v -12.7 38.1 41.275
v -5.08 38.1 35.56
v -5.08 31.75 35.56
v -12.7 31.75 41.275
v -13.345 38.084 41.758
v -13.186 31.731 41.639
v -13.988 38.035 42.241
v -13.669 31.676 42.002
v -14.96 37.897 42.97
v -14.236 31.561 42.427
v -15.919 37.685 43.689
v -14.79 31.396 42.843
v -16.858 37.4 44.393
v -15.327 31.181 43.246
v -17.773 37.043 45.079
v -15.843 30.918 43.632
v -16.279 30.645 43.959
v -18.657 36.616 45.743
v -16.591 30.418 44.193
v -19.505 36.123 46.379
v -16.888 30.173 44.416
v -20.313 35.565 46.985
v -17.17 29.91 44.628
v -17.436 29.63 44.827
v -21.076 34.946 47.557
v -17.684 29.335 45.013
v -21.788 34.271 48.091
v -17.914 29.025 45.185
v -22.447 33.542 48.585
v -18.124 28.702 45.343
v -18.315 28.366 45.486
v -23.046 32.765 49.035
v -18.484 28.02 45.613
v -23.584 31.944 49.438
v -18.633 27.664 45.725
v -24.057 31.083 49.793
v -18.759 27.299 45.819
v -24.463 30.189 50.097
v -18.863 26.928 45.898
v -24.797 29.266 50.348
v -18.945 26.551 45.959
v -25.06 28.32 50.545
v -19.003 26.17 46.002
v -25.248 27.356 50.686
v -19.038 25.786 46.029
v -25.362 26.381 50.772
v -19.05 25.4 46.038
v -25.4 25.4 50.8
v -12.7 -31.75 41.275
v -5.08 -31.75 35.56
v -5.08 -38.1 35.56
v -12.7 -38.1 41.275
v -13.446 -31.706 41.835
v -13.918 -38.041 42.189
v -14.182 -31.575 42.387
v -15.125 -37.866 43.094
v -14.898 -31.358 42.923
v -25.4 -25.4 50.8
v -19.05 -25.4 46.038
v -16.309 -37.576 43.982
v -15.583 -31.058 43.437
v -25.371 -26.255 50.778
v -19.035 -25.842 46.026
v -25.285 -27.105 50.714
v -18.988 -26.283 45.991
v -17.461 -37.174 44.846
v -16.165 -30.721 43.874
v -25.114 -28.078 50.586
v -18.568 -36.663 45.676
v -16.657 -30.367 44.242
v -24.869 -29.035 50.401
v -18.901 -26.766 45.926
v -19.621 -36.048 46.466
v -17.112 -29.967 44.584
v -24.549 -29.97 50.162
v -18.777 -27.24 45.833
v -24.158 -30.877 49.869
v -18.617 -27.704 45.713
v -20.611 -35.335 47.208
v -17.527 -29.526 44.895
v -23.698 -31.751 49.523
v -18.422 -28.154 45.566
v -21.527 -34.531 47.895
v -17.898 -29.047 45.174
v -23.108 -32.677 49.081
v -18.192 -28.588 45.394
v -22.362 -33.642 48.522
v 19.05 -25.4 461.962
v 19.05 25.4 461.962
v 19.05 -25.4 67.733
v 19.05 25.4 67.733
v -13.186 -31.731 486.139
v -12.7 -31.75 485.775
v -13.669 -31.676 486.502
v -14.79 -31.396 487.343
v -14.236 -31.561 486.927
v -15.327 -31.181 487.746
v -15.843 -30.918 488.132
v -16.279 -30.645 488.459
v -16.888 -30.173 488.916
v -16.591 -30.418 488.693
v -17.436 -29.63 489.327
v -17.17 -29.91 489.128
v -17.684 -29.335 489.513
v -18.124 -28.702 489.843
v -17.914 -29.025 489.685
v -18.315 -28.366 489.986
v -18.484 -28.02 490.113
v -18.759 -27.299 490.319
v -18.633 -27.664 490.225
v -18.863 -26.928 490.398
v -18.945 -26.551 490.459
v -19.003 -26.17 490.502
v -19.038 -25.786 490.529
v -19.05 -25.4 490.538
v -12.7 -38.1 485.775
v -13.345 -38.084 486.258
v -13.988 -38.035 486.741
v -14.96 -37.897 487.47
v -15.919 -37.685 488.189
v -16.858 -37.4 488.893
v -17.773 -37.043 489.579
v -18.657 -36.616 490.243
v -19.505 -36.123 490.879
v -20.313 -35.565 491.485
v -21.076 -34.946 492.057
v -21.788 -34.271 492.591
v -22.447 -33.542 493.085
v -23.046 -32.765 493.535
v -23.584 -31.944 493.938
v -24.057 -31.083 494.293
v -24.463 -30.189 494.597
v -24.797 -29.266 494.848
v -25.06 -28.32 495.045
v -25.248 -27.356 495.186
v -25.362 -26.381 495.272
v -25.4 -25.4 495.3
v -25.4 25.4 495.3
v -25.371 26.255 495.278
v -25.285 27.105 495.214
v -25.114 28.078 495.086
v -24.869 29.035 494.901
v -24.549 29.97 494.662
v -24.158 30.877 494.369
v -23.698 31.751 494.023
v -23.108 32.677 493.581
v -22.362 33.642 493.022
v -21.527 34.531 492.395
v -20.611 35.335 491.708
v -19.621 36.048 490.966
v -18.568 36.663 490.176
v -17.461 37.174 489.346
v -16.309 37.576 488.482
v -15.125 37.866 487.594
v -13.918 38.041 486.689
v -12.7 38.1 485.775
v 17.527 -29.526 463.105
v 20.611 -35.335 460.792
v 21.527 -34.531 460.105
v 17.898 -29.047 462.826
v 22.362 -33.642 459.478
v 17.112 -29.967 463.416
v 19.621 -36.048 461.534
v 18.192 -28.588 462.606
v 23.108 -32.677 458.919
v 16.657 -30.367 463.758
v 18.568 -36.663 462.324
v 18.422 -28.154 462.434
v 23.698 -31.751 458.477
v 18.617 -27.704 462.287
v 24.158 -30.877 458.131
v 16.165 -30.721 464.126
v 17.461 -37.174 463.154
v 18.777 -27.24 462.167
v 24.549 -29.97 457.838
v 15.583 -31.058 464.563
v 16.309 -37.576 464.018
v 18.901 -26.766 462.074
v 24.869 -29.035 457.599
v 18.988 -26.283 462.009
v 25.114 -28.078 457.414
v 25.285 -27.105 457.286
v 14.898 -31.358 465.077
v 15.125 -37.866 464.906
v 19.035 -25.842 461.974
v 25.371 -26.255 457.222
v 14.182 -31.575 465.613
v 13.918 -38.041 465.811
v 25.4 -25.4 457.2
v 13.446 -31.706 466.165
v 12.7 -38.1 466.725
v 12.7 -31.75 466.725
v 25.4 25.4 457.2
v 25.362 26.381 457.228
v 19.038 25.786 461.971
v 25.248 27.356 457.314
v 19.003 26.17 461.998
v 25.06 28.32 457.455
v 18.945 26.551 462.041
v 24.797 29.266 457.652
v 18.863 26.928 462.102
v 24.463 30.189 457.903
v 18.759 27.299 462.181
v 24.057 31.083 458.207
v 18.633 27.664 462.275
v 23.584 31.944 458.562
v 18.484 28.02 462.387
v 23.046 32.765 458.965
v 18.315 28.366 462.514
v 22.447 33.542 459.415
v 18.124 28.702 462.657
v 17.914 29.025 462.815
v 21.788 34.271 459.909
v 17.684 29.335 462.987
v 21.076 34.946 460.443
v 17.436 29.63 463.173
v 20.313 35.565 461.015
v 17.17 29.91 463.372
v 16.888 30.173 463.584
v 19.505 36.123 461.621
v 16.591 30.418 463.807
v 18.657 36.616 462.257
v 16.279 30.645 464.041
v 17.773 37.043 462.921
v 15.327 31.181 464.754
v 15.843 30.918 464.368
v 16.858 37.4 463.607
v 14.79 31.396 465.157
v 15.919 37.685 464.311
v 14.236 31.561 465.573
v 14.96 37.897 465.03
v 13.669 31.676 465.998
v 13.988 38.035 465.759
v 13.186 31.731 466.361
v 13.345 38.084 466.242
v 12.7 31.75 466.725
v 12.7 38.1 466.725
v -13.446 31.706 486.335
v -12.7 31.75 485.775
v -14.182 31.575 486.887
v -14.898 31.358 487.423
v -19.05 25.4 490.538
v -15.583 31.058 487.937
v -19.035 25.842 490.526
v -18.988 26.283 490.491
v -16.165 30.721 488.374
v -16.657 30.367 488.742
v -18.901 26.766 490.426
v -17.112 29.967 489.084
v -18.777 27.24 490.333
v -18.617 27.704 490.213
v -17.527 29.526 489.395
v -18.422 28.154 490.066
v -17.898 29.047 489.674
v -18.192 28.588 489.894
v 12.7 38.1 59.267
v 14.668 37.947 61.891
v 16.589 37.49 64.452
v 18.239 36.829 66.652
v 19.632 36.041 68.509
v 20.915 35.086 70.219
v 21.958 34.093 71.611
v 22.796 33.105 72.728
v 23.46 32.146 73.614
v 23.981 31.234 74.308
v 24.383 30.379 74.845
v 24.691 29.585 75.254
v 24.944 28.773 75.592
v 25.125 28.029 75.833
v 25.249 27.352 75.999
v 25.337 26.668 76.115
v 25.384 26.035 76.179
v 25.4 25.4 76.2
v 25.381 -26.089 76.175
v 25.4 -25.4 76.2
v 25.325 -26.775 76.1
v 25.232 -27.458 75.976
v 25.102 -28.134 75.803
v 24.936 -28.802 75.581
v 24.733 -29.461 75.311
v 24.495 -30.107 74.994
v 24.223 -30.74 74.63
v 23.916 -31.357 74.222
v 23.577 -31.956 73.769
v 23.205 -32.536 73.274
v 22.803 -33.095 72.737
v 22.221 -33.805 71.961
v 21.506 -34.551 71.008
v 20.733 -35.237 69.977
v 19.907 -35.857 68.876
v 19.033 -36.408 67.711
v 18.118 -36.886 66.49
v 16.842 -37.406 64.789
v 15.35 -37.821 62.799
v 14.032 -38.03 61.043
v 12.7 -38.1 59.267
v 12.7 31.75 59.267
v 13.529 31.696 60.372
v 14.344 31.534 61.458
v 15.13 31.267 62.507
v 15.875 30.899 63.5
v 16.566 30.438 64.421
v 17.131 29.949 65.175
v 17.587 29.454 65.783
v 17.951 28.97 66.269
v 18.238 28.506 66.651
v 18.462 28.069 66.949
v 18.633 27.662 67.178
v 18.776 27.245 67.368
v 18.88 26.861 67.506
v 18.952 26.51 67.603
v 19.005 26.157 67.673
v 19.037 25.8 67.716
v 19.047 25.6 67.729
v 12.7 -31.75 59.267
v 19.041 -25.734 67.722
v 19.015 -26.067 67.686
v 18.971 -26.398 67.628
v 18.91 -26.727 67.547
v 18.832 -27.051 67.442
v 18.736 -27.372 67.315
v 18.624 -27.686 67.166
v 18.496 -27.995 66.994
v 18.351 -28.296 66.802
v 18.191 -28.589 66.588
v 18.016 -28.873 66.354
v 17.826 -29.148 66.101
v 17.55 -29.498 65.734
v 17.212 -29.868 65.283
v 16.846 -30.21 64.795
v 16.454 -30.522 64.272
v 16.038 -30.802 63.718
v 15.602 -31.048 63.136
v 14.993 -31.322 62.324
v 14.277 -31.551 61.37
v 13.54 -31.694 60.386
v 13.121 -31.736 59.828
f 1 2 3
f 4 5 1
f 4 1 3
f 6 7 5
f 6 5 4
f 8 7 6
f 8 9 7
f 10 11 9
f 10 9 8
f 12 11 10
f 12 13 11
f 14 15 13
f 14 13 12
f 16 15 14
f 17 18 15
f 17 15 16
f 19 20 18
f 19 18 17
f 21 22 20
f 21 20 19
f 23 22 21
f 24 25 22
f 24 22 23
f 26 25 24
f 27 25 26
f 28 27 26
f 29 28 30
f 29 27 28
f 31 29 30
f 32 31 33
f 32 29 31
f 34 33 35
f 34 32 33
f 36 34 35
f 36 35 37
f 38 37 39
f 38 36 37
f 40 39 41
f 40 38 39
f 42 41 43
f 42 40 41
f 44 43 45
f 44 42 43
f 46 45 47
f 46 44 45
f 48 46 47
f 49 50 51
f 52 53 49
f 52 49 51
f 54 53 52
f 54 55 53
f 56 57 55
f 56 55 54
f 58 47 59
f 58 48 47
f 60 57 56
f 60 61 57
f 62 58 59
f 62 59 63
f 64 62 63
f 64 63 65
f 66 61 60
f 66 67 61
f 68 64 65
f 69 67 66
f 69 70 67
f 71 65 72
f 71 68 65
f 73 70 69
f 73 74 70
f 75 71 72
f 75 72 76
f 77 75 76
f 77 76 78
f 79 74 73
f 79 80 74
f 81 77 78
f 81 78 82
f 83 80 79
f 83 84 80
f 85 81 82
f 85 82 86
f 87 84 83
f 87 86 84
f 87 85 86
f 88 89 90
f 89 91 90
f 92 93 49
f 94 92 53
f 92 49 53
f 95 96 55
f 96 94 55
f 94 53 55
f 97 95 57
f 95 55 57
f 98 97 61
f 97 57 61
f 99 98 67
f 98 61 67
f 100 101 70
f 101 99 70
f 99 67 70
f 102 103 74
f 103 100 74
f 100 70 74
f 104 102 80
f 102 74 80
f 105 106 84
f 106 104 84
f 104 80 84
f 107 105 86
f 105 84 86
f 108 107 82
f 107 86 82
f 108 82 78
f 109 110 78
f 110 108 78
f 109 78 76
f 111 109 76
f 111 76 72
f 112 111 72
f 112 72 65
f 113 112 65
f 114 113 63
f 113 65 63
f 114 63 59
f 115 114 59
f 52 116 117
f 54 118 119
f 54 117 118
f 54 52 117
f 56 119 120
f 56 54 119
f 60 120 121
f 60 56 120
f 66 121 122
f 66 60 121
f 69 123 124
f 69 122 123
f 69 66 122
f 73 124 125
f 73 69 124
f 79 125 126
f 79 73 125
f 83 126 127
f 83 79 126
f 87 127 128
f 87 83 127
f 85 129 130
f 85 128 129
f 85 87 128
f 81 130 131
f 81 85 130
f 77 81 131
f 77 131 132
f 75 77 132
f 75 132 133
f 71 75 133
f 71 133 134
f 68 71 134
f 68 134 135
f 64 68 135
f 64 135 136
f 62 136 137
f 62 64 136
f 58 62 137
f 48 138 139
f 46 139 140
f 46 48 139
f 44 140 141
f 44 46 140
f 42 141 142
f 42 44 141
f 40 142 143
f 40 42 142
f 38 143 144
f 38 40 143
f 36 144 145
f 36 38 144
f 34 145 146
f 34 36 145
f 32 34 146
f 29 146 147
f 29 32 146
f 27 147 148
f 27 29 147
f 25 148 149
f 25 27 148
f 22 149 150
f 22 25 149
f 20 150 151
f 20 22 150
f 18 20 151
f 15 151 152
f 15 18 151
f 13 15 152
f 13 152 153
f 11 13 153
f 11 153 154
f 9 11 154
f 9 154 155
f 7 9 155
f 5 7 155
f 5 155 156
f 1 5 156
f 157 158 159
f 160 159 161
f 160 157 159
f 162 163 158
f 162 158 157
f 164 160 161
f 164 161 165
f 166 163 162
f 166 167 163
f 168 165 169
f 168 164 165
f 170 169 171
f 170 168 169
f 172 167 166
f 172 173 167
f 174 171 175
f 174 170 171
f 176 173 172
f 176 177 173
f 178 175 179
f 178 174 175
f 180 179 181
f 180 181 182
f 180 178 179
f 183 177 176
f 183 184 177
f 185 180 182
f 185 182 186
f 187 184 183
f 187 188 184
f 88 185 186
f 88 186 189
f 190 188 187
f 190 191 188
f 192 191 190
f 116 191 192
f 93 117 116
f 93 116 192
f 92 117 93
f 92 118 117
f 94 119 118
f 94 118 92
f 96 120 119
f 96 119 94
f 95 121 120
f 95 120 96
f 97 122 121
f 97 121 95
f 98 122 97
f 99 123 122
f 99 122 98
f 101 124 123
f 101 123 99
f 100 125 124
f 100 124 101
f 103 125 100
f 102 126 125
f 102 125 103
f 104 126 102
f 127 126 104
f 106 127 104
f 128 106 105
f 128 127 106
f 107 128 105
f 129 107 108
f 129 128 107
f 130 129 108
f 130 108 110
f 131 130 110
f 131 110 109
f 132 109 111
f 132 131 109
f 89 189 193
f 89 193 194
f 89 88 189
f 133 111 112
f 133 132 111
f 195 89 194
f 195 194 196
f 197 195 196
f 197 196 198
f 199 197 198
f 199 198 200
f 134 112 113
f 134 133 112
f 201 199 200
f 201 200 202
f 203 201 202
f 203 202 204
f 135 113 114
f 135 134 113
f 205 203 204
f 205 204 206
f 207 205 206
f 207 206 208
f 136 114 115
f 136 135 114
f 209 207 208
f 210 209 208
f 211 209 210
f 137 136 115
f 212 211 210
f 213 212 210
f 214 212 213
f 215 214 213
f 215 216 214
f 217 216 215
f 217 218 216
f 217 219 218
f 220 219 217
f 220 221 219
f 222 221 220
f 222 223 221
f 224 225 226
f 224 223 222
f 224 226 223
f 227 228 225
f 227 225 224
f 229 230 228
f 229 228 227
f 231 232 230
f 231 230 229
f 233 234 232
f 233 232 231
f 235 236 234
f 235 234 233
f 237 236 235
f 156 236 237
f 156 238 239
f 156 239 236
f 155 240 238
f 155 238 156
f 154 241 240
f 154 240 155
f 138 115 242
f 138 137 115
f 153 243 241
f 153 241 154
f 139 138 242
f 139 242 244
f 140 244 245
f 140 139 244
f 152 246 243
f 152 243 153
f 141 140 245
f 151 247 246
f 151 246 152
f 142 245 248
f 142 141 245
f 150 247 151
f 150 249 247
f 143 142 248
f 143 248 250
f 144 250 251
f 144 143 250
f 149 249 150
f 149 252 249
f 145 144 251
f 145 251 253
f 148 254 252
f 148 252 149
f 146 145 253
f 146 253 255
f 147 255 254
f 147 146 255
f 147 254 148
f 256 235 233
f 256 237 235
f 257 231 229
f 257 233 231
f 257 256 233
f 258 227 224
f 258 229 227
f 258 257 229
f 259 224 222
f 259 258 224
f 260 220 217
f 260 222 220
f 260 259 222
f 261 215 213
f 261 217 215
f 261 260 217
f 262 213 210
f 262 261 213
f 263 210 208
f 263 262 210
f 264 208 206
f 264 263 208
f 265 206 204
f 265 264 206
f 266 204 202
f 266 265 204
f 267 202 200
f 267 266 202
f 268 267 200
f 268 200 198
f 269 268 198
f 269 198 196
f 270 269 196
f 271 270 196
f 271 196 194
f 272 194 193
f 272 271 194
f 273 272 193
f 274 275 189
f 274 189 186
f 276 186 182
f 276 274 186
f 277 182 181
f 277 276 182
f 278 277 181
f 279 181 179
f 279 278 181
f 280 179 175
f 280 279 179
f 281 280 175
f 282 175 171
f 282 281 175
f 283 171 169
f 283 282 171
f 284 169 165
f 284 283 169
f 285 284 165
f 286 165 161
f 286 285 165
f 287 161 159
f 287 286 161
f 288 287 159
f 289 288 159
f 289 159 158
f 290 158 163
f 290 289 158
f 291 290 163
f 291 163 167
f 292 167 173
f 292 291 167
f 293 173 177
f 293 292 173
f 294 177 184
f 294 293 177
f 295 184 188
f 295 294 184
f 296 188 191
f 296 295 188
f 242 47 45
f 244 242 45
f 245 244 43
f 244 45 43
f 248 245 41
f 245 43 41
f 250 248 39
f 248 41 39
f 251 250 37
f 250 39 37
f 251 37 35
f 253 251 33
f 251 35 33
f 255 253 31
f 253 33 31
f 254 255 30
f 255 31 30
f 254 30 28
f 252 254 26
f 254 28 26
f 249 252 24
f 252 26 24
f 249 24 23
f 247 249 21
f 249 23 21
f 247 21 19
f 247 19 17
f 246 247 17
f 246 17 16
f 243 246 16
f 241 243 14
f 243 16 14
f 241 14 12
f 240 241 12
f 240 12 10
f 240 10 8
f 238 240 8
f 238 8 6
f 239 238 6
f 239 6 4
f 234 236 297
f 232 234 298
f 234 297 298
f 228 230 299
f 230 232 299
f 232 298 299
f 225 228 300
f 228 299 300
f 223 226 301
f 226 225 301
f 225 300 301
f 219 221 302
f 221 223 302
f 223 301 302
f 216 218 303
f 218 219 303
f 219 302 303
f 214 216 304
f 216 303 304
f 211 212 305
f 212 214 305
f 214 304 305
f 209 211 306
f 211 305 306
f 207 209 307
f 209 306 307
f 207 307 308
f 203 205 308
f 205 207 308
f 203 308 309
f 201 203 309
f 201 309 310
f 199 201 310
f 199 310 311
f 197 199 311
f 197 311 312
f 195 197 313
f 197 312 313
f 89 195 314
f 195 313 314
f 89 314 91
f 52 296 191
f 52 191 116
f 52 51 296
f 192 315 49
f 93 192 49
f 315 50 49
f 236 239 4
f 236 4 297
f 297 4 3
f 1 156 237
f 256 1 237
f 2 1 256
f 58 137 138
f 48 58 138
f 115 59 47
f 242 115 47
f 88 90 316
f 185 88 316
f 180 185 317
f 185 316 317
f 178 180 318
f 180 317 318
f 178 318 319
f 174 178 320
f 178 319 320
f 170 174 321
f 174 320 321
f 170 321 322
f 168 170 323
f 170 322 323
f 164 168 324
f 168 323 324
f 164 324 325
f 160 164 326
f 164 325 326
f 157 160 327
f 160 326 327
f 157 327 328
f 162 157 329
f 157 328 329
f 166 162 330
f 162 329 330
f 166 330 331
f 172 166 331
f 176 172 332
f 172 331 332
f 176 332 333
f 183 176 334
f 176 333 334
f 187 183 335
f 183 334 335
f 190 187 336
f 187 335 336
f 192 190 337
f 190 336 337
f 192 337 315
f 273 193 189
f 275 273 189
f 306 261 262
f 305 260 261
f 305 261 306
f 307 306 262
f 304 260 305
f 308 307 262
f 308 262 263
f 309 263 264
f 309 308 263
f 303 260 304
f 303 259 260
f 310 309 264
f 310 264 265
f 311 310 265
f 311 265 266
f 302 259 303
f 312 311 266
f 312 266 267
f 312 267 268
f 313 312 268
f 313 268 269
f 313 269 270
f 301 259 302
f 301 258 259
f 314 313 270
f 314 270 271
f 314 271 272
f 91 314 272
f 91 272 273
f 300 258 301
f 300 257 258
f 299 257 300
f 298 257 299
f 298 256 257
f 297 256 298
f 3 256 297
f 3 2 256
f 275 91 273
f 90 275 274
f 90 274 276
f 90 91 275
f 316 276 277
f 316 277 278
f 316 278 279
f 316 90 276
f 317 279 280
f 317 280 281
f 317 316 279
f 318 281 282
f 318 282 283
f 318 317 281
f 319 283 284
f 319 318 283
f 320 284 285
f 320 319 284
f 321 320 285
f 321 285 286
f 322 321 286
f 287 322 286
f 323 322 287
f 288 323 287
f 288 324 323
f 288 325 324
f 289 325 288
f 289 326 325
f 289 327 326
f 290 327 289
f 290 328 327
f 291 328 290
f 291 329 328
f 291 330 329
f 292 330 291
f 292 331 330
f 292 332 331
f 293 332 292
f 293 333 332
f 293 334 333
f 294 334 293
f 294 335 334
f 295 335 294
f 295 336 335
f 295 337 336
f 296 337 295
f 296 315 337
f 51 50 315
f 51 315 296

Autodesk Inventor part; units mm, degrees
ref_plane "Start Plane" through (0, 0, 35.56) normal (0, 0, 1) x (1, 0, 0)
ref_plane "End Plane" through (0, 0, 495.3) normal (0, 0, 1) x (1, 0, 0)
sketch "Sketch" plane through (0, 0, 0) normal (0, 0, 1) x (1, 0, 0)
  line L0 (-25.4, -25.4) -> (-25.4, 25.4)
  line L1 (-12.7, 38.1) -> (12.7, 38.1)
  line L2 (25.4, 25.4) -> (25.4, -25.4)
  line L3 (12.7, -38.1) -> (-12.7, -38.1)
  arc A0 (-25.4, -25.4) -> (-12.7, -38.1) centre (-12.7, -25.4) ccw
  arc A1 (-12.7, 38.1) -> (-25.4, 25.4) centre (-12.7, 25.4) ccw
  arc A2 (25.4, 25.4) -> (12.7, 38.1) centre (12.7, 25.4) ccw
  arc A3 (12.7, -38.1) -> (25.4, -25.4) centre (12.7, -25.4) ccw
  arc A4 (-12.7, 31.75) -> (-19.05, 25.4) centre (-12.7, 25.4) ccw
  line L4 (-12.7, 31.75) -> (12.7, 31.75)
  arc A5 (19.05, 25.4) -> (12.7, 31.75) centre (12.7, 25.4) ccw
  line L5 (19.05, 25.4) -> (19.05, -25.4)
  arc A6 (12.7, -31.75) -> (19.05, -25.4) centre (12.7, -25.4) ccw
  line L6 (12.7, -31.75) -> (-12.7, -31.75)
  arc A7 (-19.05, -25.4) -> (-12.7, -31.75) centre (-12.7, -25.4) ccw
  line L7 (-19.05, -25.4) -> (-19.05, 25.4)
  line L8 (0, 57.0224) -> (0, -57.0224) construction
  line L9 (-39.2424, 0) -> (39.2424, 0) construction
  dimension "d10" = 76.2
  dimension "d11" = 50.8
  dimension "d12" = 6.35
  dimension "d15" = 38.1
  dimension "d16" = 25.4
  dimension "d17" = 12.7
extrude "Body" add sketch "Sketch" along normal up to surface (459.74 mm away) from surface at 35.56
sketch "Sketch3" plane through (0, 0, 0) normal (0, 0, 1) x (1, 0, 0)
  line L0 (0, 0) -> (10, 0)
ref_plane "Work Plane3" through (0, 0, 0) normal (0, -1, 0) x (1, 0, 0)
ref_plane "Work Plane4" through (-716.28, -25.4, 568.96) normal (-0.6, 0, -0.8) x (-0.8, 0, 0.6)
split "Split1" plane through (-716.28, -25.4, 568.96) removes the side toward (-0.6, 0, -0.8)
ref_plane "Work Plane5" through (228.6, -25.4, 304.8) normal (0.6, 0, 0.8) x (0.8, 0, -0.6)
split "Split2" plane through (228.6, -25.4, 304.8) removes the side toward (0.6, 0, 0.8)
ref_plane "Work Plane6" through (223.52, 25.4, 340.36) normal (0.8, 0, -0.6) x (-0.6, 0, -0.8)
split "Split3" plane through (223.52, 25.4, 340.36) removes the side toward (0.8, 0, -0.6)
sketch "Sketch4" plane through (0, 0, 0) normal (0, -1, 0) x (1, 0, 0)
  line L0 (-2, 35.56) -> (12, 35.56) projected
  line L1 (-2, 495.3) -> (12, 495.3) projected
  dimension "d19" = 459.74
equation "\"d10\" = G_H"
equation "\"d11\" = G_W"
equation "\"d12\" = G_T"
equation "\"d15\" = 0.5 * d10"
equation "\"d16\" = 0.5 * d11"
equation "\"d17\" = G_IR"
equation "\"d3\" = G_L"
equation "\"G_W\" = 50.8"
equation "\"G_H\" = 76.2"
equation "\"G_T\" = 6.35"
equation "\"G_IR\" = 12.7"
equation "\"G_L\" = d19"
equation "\"G_OFFSET_START\" = -35.56"
equation "\"G_OFFSET_END\" = -12.7"
equation "\"d13\" = -G_OFFSET_START"
equation "\"d14\" = G_OFFSET_END + B_L"
equation "\"B_L\" = 508"
properties part number "AISC - 3 x 2 x 1/4 - 18.1" material "Steel, Mild"
